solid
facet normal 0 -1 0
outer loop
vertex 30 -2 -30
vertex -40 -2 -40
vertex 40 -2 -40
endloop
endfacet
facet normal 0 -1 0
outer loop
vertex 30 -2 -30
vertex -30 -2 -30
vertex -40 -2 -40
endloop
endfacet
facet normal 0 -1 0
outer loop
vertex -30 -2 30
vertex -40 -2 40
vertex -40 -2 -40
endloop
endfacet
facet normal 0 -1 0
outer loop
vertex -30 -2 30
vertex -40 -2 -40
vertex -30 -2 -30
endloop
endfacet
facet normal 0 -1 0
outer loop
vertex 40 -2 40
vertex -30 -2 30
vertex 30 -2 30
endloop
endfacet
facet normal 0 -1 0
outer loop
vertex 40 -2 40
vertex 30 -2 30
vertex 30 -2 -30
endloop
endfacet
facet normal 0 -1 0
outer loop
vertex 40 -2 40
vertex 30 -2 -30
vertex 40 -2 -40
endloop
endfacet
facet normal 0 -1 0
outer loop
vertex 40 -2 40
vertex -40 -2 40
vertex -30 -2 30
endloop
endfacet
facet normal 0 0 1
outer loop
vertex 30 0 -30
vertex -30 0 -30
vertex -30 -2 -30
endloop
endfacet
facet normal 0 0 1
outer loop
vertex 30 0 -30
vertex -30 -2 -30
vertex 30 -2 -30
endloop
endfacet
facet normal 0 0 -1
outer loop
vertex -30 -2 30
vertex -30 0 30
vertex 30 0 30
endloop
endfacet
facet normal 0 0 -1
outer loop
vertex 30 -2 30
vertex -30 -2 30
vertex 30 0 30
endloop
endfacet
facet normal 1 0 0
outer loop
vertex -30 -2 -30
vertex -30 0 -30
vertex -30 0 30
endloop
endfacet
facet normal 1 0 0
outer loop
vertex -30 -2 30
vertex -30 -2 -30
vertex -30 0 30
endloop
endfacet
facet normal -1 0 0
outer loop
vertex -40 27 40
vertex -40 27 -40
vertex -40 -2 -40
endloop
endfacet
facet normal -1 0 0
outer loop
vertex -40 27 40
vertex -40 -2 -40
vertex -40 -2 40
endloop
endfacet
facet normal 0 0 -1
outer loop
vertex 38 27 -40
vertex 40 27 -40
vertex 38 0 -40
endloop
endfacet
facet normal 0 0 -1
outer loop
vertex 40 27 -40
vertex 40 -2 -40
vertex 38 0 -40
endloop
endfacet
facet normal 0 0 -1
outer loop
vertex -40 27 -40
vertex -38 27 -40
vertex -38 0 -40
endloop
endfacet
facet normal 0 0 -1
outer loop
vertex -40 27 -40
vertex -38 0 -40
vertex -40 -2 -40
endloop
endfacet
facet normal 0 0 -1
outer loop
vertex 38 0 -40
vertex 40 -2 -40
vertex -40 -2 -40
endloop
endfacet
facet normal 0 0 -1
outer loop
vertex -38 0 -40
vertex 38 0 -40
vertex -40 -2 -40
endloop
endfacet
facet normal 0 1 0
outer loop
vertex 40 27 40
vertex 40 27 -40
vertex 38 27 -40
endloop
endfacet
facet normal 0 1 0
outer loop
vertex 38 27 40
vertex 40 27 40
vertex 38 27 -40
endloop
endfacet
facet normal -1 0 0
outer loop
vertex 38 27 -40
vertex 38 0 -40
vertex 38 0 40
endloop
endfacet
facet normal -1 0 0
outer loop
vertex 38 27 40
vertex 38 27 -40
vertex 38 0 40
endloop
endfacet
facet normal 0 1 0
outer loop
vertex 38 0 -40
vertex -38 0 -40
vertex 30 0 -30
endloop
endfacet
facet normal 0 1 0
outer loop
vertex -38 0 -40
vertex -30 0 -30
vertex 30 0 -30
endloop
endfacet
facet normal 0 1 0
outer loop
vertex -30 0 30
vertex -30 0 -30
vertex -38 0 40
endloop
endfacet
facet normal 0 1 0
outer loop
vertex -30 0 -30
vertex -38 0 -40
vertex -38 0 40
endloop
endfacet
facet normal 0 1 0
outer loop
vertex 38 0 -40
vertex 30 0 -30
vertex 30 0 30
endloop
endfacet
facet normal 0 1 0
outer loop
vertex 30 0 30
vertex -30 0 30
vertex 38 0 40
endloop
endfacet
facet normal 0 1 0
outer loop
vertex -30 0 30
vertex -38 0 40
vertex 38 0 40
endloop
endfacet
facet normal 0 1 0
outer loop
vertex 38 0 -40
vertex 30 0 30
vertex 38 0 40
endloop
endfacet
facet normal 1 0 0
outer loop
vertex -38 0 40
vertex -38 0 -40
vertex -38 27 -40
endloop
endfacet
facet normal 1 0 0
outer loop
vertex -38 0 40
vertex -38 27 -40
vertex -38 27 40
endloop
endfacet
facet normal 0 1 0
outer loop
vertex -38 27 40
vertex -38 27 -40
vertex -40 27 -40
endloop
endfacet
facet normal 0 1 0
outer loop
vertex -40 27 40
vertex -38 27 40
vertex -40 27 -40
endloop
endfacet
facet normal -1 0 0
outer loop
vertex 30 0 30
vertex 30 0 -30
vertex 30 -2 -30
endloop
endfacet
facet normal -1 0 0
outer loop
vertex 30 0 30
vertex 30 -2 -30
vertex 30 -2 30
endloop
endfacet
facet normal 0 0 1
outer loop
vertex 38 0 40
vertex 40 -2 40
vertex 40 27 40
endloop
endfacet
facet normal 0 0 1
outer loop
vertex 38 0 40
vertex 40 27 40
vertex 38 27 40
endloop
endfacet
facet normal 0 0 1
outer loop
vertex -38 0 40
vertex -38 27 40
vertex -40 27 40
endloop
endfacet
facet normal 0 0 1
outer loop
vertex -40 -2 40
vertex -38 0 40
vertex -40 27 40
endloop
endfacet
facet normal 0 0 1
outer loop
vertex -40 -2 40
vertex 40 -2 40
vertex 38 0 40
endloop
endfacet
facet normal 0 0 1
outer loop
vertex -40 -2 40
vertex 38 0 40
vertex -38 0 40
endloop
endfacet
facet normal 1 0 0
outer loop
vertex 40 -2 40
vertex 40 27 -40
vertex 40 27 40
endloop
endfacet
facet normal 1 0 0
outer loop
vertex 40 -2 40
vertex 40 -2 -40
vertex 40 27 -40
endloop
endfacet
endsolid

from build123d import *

# Parameters (mm, degrees)
F0_W     = 80
F0_H     = 80
F0_W_2   = 60
F0_H_2   = 60
F1_DEPTH = 2
F2_W     = 2
F2_H     = 80
F3_DEPTH = 27


with BuildPart() as f1:
    # F0 (on Front) → F1 (new body)
    with BuildSketch(Plane.XZ):
        Rectangle(F0_W, F0_H)
        Rectangle(F0_W_2, F0_H_2, mode=Mode.SUBTRACT)
    extrude(amount=F1_DEPTH)

    # F2 (on face) → F3 (join)
    with BuildSketch(Plane(origin=(0, 0, 0), x_dir=(-1, 0, 0), z_dir=(0, 1, 0))):
        with Locations((-39, 0)):
            Rectangle(F2_W, F2_H)
        with Locations((39, 0)):
            Rectangle(F2_W, F2_H)
    extrude(amount=F3_DEPTH)


solid = f1.part
